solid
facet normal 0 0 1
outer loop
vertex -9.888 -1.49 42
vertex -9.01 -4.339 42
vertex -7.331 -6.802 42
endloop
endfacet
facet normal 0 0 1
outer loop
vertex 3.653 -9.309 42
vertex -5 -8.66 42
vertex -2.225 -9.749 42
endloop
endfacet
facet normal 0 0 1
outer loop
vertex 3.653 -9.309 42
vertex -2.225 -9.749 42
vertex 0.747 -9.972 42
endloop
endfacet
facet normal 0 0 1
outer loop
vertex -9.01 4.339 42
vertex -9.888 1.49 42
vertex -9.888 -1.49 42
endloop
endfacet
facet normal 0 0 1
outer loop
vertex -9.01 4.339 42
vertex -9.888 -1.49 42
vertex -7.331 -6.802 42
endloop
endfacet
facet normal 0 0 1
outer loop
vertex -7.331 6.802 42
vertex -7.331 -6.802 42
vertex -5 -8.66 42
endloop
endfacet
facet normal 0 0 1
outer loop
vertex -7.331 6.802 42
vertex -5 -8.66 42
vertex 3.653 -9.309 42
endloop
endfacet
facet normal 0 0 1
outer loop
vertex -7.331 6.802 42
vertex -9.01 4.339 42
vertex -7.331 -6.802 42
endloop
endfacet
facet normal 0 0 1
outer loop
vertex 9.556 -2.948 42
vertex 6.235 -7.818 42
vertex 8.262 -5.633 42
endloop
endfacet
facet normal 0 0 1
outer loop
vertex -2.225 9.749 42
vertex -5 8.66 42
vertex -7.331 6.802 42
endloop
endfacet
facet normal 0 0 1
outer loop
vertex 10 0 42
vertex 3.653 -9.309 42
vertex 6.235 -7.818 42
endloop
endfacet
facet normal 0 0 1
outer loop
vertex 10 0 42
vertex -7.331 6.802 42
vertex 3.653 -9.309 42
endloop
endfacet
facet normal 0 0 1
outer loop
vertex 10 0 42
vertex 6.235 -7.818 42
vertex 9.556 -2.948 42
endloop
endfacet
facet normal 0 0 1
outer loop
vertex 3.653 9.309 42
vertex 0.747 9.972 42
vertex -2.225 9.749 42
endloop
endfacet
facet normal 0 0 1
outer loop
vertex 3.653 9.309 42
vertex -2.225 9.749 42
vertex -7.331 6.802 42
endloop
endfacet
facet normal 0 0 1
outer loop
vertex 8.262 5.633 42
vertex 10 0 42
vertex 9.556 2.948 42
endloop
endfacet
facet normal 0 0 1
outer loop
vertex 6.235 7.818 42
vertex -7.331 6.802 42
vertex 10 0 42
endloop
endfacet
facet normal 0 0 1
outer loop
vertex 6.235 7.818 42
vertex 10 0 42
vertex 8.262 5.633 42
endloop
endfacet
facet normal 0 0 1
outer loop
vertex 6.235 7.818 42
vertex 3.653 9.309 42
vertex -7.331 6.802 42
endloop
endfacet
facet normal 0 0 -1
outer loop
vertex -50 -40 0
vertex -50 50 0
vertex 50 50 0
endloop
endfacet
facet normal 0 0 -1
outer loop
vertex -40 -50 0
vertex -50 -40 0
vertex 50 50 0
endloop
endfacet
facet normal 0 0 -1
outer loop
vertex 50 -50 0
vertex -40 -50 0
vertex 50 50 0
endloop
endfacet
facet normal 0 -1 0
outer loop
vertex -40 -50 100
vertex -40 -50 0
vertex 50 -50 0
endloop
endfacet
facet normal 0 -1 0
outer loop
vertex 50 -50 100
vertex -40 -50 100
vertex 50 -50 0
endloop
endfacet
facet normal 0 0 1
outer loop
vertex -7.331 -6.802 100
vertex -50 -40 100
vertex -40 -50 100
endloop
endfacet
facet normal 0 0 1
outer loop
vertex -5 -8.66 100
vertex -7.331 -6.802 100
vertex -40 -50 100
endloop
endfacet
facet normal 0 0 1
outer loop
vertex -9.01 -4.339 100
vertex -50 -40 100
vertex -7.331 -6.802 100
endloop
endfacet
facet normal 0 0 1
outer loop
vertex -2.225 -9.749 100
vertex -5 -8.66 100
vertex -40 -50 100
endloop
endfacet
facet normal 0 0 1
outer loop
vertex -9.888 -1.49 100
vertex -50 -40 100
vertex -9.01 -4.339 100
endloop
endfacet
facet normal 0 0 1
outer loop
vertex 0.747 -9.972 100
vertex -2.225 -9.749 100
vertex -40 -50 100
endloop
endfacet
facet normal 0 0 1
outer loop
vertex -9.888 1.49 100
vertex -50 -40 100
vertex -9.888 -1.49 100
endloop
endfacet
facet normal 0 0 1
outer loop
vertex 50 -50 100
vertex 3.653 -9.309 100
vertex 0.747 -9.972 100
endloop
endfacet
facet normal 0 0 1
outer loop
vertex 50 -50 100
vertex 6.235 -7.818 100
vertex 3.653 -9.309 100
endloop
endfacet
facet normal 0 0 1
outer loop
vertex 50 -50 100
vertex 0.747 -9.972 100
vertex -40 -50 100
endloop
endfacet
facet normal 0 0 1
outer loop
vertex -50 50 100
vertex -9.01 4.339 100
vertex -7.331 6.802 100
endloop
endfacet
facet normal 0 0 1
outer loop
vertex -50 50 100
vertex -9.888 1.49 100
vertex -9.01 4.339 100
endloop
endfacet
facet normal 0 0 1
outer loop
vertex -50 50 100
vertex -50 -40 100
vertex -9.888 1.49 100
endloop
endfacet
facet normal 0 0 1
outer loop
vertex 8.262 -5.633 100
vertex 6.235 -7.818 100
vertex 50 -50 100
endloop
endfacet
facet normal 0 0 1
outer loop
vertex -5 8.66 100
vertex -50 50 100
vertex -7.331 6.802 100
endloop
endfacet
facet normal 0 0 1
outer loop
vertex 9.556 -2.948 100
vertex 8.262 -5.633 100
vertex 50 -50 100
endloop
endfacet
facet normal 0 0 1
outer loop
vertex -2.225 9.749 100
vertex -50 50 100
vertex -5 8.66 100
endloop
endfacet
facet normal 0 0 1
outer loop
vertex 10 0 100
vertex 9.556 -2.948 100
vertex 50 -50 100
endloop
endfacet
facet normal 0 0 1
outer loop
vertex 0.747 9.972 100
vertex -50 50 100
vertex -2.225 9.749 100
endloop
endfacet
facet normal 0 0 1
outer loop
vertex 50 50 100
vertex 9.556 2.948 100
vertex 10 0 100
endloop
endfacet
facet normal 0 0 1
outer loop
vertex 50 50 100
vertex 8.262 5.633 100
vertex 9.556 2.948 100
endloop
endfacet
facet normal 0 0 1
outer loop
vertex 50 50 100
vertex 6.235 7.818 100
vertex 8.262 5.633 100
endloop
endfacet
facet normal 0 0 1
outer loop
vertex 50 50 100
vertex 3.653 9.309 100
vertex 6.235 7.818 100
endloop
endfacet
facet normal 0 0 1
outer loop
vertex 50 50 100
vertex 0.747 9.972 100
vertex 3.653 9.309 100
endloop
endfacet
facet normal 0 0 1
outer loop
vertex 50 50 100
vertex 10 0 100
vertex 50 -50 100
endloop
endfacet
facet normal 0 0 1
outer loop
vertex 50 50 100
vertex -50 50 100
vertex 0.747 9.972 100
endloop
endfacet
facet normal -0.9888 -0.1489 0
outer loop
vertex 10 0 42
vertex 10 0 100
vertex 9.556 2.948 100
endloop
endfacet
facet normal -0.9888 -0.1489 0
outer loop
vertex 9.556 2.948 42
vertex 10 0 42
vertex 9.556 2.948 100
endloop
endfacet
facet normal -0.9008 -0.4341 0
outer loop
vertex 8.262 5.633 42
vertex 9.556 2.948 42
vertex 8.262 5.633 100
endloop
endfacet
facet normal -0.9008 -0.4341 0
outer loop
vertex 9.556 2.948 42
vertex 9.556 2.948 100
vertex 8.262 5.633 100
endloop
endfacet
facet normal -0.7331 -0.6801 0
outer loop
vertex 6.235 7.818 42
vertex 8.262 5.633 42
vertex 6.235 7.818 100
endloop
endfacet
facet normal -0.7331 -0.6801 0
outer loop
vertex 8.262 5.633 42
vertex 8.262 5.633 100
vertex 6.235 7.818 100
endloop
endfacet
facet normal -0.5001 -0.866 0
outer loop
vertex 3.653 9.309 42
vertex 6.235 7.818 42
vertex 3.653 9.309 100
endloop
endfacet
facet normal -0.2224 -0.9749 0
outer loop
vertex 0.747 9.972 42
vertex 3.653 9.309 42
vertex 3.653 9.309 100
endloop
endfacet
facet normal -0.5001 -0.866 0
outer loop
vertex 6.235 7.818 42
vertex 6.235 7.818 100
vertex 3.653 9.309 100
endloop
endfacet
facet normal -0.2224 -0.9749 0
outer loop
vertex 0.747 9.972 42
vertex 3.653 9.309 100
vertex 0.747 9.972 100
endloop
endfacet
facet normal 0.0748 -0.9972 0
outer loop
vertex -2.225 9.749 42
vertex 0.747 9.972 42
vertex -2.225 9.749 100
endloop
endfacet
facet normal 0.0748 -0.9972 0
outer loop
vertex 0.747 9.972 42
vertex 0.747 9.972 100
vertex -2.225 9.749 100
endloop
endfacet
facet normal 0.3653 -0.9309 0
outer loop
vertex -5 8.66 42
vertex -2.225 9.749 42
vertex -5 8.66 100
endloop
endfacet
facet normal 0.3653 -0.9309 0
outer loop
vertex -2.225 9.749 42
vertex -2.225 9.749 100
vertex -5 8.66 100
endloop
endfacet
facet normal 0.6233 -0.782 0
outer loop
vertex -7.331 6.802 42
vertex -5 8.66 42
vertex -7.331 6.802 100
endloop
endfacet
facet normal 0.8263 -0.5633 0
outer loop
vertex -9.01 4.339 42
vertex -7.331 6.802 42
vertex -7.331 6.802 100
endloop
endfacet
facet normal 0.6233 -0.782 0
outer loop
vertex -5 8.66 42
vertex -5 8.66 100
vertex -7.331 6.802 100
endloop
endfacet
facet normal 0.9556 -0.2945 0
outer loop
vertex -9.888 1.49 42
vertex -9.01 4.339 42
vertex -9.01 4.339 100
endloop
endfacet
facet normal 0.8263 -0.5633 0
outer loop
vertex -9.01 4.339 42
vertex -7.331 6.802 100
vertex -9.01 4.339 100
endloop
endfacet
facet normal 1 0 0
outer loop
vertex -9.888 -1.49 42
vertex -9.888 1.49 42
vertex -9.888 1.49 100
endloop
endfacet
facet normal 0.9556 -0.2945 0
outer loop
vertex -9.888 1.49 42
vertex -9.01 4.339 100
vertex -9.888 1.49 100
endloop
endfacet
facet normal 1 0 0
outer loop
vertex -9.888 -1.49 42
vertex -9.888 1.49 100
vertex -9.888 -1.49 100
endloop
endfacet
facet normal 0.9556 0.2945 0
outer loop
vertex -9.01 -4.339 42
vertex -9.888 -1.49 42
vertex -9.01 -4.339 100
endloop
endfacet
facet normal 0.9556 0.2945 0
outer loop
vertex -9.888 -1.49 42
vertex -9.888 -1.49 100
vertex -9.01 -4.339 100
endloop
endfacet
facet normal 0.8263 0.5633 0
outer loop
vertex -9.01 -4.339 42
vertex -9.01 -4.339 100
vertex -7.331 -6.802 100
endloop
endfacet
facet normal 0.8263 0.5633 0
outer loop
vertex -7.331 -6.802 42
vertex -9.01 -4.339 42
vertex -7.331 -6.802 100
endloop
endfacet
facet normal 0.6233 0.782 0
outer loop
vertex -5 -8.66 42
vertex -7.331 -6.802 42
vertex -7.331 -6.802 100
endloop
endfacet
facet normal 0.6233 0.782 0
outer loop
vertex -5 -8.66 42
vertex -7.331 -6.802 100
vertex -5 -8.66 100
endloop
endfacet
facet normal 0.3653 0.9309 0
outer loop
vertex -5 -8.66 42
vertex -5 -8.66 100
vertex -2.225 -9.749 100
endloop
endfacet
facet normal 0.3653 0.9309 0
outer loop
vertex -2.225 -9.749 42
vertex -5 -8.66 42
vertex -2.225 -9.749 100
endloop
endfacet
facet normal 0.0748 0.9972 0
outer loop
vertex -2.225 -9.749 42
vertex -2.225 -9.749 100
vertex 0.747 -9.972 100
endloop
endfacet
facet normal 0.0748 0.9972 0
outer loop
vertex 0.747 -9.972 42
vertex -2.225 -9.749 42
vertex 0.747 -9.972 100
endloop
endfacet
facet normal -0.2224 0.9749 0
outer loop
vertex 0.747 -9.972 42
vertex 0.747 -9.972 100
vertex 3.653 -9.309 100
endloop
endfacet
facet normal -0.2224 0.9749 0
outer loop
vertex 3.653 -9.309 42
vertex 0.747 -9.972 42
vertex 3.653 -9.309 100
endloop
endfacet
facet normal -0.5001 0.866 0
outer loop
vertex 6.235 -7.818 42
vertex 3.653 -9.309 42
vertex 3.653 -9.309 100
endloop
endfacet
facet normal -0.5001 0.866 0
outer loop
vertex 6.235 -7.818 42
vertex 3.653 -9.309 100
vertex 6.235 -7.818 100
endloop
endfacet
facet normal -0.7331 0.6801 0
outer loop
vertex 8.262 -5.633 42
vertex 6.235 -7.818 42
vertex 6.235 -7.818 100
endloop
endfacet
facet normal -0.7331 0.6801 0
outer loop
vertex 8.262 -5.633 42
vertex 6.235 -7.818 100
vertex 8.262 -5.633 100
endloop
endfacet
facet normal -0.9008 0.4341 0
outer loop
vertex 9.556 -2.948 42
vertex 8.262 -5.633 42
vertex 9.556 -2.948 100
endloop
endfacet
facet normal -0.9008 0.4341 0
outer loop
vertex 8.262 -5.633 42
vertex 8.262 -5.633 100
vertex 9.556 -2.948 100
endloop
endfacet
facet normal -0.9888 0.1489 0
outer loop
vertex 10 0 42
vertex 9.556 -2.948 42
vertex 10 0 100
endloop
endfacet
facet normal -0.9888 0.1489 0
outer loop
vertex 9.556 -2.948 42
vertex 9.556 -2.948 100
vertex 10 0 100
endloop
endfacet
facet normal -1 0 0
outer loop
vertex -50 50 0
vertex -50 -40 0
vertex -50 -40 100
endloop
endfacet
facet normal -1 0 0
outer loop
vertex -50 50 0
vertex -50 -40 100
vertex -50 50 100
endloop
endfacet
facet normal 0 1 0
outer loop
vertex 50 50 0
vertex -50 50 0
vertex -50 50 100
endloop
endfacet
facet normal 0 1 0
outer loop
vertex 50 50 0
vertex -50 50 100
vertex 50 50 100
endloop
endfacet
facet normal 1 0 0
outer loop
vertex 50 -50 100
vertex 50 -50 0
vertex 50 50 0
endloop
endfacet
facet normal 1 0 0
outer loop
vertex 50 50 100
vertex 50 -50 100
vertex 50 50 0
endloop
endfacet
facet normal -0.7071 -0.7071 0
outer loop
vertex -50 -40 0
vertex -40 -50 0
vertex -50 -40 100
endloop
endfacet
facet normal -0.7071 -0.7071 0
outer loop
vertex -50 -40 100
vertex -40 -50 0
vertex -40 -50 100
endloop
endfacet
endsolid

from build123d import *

# Parameters (mm, degrees)
SKETCH1_W           = 100
SKETCH1_H           = 100
BOSS_EXTRUDE1_DEPTH = 100
SKETCH2_R           = 10
CUT_EXTRUDE1_DEPTH  = 58
CHAMFER1_SIZE       = 10


with BuildPart() as part:
    # Sketch1 → Boss-Extrude1 (new body)
    with BuildSketch(Plane.XY):
        Rectangle(SKETCH1_W, SKETCH1_H)
    extrude(amount=BOSS_EXTRUDE1_DEPTH)

    # Sketch2 → Cut-Extrude1 (cut)
    with BuildSketch(Plane.XY.offset(100)):
        Circle(SKETCH2_R)
    extrude(amount=-CUT_EXTRUDE1_DEPTH, mode=Mode.SUBTRACT)

    # Chamfer1
    chamfer1_edges = [part.edges().sort_by_distance(p)[0] for p in [
        (-50, -50, 50),
    ]]
    chamfer(chamfer1_edges, length=CHAMFER1_SIZE)


solid = part.part
